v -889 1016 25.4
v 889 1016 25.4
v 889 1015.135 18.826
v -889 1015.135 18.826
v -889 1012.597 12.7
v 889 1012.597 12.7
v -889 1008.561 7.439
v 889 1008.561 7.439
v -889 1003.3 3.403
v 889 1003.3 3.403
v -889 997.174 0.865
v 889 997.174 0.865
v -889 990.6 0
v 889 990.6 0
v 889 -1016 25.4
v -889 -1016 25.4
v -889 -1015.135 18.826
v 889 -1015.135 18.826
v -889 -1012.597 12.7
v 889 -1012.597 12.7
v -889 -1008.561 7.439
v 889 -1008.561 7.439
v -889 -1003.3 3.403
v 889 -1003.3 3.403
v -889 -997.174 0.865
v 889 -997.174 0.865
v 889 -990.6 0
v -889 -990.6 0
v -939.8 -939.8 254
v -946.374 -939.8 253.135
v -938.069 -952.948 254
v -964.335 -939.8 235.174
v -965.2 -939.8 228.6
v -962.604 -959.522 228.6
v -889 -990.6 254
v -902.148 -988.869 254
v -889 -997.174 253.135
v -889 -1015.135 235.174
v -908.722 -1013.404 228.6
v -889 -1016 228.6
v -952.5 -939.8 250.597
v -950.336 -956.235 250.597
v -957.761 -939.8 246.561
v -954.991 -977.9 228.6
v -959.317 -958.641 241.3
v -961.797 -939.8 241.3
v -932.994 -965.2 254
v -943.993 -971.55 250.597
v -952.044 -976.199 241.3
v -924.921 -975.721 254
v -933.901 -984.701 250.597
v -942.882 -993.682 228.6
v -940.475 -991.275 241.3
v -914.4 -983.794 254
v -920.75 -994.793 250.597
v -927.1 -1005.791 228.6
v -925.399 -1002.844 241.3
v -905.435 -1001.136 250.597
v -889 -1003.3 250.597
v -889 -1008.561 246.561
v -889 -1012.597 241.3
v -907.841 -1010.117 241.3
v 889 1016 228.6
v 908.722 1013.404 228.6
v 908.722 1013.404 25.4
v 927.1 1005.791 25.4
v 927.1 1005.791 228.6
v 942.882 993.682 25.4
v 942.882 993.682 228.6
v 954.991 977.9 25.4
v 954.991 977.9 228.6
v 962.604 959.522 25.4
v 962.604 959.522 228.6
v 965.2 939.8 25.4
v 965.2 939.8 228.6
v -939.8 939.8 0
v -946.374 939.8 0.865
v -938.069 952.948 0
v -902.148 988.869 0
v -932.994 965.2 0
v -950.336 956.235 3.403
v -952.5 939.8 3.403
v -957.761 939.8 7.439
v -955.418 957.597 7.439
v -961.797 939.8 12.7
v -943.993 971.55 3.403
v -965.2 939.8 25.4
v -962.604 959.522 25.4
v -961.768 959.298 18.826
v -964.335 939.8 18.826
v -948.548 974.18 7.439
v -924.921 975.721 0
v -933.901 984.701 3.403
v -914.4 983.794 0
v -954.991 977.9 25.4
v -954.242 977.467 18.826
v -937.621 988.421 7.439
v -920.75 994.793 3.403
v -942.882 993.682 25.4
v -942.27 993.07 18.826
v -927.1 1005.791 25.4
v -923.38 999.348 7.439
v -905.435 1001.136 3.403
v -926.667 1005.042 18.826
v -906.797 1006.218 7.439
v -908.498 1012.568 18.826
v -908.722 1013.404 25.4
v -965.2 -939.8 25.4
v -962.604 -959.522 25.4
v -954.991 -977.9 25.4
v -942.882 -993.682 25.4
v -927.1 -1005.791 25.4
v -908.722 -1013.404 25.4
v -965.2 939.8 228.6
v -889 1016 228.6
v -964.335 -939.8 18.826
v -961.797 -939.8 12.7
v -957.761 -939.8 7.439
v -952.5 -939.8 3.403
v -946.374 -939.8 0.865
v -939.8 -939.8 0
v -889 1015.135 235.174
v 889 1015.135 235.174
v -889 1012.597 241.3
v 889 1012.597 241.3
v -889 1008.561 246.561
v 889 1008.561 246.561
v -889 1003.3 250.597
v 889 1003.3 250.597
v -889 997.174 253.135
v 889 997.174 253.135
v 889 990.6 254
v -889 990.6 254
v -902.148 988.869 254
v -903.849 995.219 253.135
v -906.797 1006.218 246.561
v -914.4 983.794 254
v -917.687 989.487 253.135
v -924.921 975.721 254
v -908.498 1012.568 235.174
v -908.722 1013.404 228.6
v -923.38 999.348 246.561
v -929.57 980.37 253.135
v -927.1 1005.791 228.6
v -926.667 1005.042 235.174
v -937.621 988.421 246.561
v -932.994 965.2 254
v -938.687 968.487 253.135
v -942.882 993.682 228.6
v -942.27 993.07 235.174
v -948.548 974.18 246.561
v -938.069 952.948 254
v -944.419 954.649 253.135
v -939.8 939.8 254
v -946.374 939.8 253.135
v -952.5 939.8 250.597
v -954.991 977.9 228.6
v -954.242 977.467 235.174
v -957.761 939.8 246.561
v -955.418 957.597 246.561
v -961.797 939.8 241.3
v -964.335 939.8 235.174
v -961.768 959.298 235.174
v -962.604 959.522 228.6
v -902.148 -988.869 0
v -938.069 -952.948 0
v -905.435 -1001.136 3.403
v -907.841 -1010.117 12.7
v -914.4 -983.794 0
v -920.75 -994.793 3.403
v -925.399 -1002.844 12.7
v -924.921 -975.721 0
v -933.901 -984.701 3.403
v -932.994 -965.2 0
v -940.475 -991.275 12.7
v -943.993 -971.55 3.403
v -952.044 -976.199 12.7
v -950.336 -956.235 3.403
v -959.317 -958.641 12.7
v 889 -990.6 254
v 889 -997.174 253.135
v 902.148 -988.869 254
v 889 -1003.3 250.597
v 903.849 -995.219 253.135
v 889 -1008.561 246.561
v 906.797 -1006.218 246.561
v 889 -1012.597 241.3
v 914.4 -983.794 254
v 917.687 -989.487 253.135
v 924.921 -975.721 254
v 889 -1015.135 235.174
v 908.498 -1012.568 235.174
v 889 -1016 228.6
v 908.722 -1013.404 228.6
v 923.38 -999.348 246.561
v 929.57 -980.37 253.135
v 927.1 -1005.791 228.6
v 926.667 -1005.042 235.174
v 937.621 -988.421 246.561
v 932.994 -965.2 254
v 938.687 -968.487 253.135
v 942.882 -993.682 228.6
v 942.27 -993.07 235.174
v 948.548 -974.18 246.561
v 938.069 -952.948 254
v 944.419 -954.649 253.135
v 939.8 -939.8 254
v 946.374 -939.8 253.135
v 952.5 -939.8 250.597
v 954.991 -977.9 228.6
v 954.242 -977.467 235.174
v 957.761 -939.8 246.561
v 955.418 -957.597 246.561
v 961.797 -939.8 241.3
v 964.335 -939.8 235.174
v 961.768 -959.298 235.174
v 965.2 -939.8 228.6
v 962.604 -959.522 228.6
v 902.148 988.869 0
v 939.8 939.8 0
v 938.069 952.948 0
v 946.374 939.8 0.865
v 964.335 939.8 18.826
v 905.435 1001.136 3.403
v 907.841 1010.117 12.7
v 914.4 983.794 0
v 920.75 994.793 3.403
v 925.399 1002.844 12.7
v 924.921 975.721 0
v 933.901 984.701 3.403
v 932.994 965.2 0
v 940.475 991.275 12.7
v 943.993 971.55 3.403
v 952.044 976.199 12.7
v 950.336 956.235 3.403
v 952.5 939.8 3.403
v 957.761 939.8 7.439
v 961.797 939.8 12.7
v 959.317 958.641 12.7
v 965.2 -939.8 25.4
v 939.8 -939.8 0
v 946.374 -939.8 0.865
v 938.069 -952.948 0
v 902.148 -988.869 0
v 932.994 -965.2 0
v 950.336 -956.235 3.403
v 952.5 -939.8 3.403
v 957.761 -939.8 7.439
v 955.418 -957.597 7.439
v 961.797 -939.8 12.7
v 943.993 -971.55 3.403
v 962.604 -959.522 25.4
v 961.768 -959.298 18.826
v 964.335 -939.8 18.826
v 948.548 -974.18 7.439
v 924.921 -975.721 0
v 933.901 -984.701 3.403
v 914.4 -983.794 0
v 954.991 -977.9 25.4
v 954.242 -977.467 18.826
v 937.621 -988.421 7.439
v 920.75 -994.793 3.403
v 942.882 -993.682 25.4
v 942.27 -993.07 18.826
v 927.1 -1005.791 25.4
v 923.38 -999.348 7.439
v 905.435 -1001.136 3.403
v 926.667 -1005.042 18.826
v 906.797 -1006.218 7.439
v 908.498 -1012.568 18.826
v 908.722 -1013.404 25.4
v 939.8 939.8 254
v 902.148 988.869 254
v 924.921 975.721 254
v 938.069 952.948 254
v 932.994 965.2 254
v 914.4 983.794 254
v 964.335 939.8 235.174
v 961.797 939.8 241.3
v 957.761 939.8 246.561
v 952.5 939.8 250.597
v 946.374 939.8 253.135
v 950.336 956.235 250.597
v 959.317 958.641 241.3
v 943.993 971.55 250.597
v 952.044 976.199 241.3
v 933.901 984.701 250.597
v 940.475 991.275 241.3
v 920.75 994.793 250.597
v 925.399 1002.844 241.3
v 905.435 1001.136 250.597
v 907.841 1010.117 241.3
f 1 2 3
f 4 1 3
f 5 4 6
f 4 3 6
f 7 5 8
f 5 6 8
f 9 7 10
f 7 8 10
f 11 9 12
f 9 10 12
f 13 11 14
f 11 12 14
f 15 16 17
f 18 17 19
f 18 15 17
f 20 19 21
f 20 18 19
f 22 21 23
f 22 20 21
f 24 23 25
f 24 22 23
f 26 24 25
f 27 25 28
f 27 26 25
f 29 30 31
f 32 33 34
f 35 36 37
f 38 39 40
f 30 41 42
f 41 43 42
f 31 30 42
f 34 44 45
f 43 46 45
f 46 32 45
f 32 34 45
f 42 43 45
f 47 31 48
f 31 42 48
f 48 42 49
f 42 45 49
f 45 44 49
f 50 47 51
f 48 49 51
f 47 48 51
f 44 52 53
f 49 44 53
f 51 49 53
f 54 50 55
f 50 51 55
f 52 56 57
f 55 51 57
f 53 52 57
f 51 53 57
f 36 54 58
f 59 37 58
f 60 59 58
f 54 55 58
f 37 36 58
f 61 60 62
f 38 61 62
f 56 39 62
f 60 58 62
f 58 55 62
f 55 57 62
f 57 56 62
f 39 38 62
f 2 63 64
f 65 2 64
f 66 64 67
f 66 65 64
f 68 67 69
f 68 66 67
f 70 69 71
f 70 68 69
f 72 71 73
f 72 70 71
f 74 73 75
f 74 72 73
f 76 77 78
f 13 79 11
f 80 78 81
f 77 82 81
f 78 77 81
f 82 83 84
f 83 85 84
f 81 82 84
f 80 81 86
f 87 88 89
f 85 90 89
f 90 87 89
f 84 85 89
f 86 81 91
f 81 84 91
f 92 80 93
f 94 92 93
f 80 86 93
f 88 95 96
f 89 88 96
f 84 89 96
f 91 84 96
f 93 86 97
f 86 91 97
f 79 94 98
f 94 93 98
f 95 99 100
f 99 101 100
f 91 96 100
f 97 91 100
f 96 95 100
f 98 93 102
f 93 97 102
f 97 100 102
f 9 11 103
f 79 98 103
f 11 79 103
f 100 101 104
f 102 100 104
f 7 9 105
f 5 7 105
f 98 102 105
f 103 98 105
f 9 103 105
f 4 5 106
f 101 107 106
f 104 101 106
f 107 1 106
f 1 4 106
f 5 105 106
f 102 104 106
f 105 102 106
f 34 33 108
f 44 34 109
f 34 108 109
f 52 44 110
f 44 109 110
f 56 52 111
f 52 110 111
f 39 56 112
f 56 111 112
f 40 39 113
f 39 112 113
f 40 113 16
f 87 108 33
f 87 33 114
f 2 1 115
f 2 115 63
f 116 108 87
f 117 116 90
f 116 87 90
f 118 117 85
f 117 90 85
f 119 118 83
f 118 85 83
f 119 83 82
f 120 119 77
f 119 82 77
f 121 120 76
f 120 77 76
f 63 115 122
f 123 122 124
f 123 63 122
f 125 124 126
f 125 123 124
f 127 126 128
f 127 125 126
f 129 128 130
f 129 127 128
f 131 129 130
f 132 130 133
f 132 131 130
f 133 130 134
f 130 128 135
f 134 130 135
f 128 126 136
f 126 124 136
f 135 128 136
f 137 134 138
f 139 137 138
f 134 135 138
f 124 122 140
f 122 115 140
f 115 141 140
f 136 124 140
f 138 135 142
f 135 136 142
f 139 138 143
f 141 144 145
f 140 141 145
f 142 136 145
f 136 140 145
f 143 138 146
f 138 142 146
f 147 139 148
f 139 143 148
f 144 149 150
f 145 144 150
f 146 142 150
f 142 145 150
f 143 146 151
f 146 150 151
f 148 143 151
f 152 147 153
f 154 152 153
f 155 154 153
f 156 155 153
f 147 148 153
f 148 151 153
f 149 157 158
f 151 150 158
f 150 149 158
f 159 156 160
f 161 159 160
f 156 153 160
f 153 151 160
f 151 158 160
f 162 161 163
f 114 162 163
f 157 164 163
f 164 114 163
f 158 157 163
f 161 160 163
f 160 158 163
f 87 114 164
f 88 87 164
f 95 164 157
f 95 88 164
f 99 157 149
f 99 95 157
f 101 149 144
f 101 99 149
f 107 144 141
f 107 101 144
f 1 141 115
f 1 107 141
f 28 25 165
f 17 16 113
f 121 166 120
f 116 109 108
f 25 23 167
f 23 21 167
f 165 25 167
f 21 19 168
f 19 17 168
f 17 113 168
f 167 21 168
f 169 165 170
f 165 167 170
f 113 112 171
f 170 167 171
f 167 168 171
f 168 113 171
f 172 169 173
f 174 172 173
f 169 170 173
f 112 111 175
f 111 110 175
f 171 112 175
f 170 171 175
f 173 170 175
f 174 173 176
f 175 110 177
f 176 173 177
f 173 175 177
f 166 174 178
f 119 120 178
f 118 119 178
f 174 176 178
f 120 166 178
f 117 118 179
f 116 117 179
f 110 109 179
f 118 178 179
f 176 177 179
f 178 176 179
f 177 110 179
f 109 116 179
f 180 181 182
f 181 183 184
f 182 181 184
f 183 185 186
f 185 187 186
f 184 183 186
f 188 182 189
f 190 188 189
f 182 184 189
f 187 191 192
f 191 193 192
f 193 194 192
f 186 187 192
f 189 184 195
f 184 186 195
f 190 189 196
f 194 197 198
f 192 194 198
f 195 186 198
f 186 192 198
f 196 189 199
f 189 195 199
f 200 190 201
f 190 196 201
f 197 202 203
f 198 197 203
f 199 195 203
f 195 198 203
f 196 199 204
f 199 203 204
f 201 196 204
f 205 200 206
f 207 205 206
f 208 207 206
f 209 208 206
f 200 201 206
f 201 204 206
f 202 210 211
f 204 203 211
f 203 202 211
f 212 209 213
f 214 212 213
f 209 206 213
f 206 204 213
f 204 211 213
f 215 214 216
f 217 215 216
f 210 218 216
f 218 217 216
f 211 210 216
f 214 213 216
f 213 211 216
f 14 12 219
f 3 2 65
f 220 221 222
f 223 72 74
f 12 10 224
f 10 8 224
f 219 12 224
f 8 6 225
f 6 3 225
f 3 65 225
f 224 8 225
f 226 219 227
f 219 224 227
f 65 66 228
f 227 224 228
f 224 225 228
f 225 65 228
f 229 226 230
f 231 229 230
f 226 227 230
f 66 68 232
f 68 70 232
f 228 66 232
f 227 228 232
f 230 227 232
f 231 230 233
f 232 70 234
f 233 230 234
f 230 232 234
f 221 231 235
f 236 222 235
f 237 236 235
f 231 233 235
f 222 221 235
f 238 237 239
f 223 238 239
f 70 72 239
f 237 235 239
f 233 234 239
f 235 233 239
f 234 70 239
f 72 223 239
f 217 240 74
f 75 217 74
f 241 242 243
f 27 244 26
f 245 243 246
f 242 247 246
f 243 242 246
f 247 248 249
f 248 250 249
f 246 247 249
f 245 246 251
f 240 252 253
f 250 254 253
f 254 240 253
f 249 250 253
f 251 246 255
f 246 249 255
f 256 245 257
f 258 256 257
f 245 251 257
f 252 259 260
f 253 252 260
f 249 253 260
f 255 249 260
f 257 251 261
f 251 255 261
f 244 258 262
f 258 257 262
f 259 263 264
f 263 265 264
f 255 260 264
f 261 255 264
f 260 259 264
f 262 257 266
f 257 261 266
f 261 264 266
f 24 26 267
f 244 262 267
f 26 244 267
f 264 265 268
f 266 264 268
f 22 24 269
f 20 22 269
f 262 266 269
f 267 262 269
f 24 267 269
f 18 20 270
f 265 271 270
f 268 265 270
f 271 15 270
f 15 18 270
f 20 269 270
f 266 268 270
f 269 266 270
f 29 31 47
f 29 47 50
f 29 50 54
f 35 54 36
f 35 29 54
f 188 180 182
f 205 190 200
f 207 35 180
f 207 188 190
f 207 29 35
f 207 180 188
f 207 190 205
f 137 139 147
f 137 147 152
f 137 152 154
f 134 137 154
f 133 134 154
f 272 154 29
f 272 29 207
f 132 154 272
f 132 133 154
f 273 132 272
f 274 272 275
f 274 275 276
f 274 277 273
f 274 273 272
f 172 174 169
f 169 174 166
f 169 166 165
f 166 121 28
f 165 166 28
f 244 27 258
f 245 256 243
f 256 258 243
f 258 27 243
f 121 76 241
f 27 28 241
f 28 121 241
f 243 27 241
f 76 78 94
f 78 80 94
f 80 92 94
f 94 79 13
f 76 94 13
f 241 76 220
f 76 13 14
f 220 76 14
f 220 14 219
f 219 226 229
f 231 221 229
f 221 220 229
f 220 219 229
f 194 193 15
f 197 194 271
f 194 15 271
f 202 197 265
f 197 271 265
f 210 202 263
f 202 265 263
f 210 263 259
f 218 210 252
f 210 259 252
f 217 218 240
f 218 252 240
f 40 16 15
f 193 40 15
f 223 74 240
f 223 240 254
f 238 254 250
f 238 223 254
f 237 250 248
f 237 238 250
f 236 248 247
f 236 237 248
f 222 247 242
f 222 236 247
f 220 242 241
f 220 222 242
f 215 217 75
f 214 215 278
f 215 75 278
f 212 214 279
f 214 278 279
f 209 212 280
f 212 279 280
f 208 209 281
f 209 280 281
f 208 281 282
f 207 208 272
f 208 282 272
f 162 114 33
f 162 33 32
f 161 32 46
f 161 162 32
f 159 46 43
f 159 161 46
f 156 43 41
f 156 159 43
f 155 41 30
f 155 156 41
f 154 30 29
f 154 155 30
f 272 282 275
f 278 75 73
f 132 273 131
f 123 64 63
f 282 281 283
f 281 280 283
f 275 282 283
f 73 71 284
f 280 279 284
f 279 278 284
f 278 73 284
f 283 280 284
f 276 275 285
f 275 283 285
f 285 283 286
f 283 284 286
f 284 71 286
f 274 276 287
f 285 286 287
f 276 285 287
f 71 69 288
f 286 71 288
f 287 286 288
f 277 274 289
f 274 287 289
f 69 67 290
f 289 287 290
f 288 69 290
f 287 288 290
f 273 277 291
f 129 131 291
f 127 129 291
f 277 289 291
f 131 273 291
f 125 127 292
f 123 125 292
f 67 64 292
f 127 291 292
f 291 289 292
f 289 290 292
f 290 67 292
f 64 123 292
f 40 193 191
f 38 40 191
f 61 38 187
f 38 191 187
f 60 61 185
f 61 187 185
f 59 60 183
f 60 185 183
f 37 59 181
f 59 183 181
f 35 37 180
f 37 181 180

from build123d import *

# Parameters (mm, degrees)
F0_W         = 1930.4
F0_H         = 2032
F1_DEPTH     = 254
F2_R         = 25.4
F3_T1_DEPTH  = 254
F3_T4_ANGLE  = 90
F3_T6_ANGLE  = 90
F3_T8_ANGLE  = 90
F3_T10_ANGLE = 90
F3_T12_ANGLE = 90
F3_T14_ANGLE = 90
F3_T16_ANGLE = 90
F3_T18_ANGLE = 90


# Not quite as in the source:
# - a fillet or chamfer that OpenCascade refuses, or shapes differently, is made with other operations: its cross-section is extruded or revolved along the edge and cut away or added


with BuildPart() as f1:
    # F0 (on Top) → F1 (new body)
    with BuildSketch(Plane.XY):
        Rectangle(F0_W, F0_H)
    extrude(amount=F1_DEPTH)

    # F2
    f2_edges = [f1.edges().sort_by_distance(p)[0] for p in [
        (0, -1016, 254),
        (965.2, 0, 254),
        (0, 1016, 254),
        (-965.2, 0, 254),
        (0, -1016, 0),
        (965.2, 0, 0),
        (0, 1016, 0),
        (-965.2, 0, 0),
    ]]
    fillet(f2_edges, radius=F2_R)

    # F3: fillet of radius 76.2 on 4 edges, made by hand

    # F3_s2 → F3_t1 (cut)
    with BuildSketch(Plane.XY):
        with BuildLine():
            ThreePointArc((889, -1016), (942.8815367264, -993.6815367264), (965.2, -939.8))
            Line((965.2, -939.8), (965.2, -1016))
            Line((965.2, -1016), (889, -1016))
        make_face()
        with BuildLine():
            ThreePointArc((889, 1016), (942.8815367264, 993.6815367264), (965.2, 939.8))
            Line((965.2, 939.8), (965.2, 1016))
            Line((965.2, 1016), (889, 1016))
        make_face()
        with BuildLine():
            ThreePointArc((-965.2, -939.8), (-942.8815367264, -993.6815367264), (-889, -1016))
            Line((-889, -1016), (-965.2, -1016))
            Line((-965.2, -1016), (-965.2, -939.8))
        make_face()
        with BuildLine():
            ThreePointArc((-965.2, 939.8), (-942.8815367264, 993.6815367264), (-889, 1016))
            Line((-889, 1016), (-965.2, 1016))
            Line((-965.2, 1016), (-965.2, 939.8))
        make_face()
    extrude(amount=F3_T1_DEPTH, mode=Mode.SUBTRACT)

    # F3_s3 → F3_t4 (revolve, cut)
    with BuildSketch(Plane.XZ.offset(-939.8)):
        with BuildLine():
            ThreePointArc((-939.8, 0), (-957.7605122421, 7.4394877579), (-965.2, 25.4))
            Line((-965.2, 25.4), (-965.2, 0))
            Line((-965.2, 0), (-939.8, 0))
        make_face()
    revolve(axis=Axis((-889, 939.8, 0), (0, 0, -1)), revolution_arc=F3_T4_ANGLE, mode=Mode.SUBTRACT)

    # F3_s5 → F3_t6 (revolve, cut)
    with BuildSketch(Plane.YZ.offset(-889)):
        with BuildLine():
            ThreePointArc((990.6, 254), (1008.5605122421, 246.5605122421), (1016, 228.6))
            Line((1016, 228.6), (1016, 254))
            Line((1016, 254), (990.6, 254))
        make_face()
    revolve(axis=Axis((-889, 939.8, 254), (0, 0, 1)), revolution_arc=F3_T6_ANGLE, mode=Mode.SUBTRACT)

    # F3_s7 → F3_t8 (revolve, cut)
    with BuildSketch(Plane.YZ.offset(-889)):
        with BuildLine():
            ThreePointArc((-990.6, 0), (-1008.5605122421, 7.4394877579), (-1016, 25.4))
            Line((-1016, 25.4), (-1016, 0))
            Line((-1016, 0), (-990.6, 0))
        make_face()
    revolve(axis=Axis((-889, -939.8, 0), (0, 0, -1)), revolution_arc=F3_T8_ANGLE, mode=Mode.SUBTRACT)

    # F3_s9 → F3_t10 (revolve, cut)
    with BuildSketch(Plane.XZ.offset(939.8)):
        with BuildLine():
            ThreePointArc((-939.8, 254), (-957.7605122421, 246.5605122421), (-965.2, 228.6))
            Line((-965.2, 228.6), (-965.2, 254))
            Line((-965.2, 254), (-939.8, 254))
        make_face()
    revolve(axis=Axis((-889, -939.8, 254), (0, 0, 1)), revolution_arc=F3_T10_ANGLE, mode=Mode.SUBTRACT)

    # F3_s11 → F3_t12 (revolve, cut)
    with BuildSketch(Plane.YZ.offset(889)):
        with BuildLine():
            ThreePointArc((990.6, 0), (1008.5605122421, 7.4394877579), (1016, 25.4))
            Line((1016, 25.4), (1016, 0))
            Line((1016, 0), (990.6, 0))
        make_face()
    revolve(axis=Axis((889, 939.8, 0), (0, 0, -1)), revolution_arc=F3_T12_ANGLE, mode=Mode.SUBTRACT)

    # F3_s13 → F3_t14 (revolve, cut)
    with BuildSketch(Plane.XZ.offset(-939.8)):
        with BuildLine():
            ThreePointArc((939.8, 254), (957.7605122421, 246.5605122421), (965.2, 228.6))
            Line((965.2, 228.6), (965.2, 254))
            Line((965.2, 254), (939.8, 254))
        make_face()
    revolve(axis=Axis((889, 939.8, 254), (0, 0, 1)), revolution_arc=F3_T14_ANGLE, mode=Mode.SUBTRACT)

    # F3_s15 → F3_t16 (revolve, cut)
    with BuildSketch(Plane.XZ.offset(939.8)):
        with BuildLine():
            ThreePointArc((939.8, 0), (957.7605122421, 7.4394877579), (965.2, 25.4))
            Line((965.2, 25.4), (965.2, 0))
            Line((965.2, 0), (939.8, 0))
        make_face()
    revolve(axis=Axis((889, -939.8, 0), (0, 0, -1)), revolution_arc=F3_T16_ANGLE, mode=Mode.SUBTRACT)

    # F3_s17 → F3_t18 (revolve, cut)
    with BuildSketch(Plane.YZ.offset(889)):
        with BuildLine():
            ThreePointArc((-990.6, 254), (-1008.5605122421, 246.5605122421), (-1016, 228.6))
            Line((-1016, 228.6), (-1016, 254))
            Line((-1016, 254), (-990.6, 254))
        make_face()
    revolve(axis=Axis((889, -939.8, 254), (0, 0, 1)), revolution_arc=F3_T18_ANGLE, mode=Mode.SUBTRACT)


solid = f1.part
